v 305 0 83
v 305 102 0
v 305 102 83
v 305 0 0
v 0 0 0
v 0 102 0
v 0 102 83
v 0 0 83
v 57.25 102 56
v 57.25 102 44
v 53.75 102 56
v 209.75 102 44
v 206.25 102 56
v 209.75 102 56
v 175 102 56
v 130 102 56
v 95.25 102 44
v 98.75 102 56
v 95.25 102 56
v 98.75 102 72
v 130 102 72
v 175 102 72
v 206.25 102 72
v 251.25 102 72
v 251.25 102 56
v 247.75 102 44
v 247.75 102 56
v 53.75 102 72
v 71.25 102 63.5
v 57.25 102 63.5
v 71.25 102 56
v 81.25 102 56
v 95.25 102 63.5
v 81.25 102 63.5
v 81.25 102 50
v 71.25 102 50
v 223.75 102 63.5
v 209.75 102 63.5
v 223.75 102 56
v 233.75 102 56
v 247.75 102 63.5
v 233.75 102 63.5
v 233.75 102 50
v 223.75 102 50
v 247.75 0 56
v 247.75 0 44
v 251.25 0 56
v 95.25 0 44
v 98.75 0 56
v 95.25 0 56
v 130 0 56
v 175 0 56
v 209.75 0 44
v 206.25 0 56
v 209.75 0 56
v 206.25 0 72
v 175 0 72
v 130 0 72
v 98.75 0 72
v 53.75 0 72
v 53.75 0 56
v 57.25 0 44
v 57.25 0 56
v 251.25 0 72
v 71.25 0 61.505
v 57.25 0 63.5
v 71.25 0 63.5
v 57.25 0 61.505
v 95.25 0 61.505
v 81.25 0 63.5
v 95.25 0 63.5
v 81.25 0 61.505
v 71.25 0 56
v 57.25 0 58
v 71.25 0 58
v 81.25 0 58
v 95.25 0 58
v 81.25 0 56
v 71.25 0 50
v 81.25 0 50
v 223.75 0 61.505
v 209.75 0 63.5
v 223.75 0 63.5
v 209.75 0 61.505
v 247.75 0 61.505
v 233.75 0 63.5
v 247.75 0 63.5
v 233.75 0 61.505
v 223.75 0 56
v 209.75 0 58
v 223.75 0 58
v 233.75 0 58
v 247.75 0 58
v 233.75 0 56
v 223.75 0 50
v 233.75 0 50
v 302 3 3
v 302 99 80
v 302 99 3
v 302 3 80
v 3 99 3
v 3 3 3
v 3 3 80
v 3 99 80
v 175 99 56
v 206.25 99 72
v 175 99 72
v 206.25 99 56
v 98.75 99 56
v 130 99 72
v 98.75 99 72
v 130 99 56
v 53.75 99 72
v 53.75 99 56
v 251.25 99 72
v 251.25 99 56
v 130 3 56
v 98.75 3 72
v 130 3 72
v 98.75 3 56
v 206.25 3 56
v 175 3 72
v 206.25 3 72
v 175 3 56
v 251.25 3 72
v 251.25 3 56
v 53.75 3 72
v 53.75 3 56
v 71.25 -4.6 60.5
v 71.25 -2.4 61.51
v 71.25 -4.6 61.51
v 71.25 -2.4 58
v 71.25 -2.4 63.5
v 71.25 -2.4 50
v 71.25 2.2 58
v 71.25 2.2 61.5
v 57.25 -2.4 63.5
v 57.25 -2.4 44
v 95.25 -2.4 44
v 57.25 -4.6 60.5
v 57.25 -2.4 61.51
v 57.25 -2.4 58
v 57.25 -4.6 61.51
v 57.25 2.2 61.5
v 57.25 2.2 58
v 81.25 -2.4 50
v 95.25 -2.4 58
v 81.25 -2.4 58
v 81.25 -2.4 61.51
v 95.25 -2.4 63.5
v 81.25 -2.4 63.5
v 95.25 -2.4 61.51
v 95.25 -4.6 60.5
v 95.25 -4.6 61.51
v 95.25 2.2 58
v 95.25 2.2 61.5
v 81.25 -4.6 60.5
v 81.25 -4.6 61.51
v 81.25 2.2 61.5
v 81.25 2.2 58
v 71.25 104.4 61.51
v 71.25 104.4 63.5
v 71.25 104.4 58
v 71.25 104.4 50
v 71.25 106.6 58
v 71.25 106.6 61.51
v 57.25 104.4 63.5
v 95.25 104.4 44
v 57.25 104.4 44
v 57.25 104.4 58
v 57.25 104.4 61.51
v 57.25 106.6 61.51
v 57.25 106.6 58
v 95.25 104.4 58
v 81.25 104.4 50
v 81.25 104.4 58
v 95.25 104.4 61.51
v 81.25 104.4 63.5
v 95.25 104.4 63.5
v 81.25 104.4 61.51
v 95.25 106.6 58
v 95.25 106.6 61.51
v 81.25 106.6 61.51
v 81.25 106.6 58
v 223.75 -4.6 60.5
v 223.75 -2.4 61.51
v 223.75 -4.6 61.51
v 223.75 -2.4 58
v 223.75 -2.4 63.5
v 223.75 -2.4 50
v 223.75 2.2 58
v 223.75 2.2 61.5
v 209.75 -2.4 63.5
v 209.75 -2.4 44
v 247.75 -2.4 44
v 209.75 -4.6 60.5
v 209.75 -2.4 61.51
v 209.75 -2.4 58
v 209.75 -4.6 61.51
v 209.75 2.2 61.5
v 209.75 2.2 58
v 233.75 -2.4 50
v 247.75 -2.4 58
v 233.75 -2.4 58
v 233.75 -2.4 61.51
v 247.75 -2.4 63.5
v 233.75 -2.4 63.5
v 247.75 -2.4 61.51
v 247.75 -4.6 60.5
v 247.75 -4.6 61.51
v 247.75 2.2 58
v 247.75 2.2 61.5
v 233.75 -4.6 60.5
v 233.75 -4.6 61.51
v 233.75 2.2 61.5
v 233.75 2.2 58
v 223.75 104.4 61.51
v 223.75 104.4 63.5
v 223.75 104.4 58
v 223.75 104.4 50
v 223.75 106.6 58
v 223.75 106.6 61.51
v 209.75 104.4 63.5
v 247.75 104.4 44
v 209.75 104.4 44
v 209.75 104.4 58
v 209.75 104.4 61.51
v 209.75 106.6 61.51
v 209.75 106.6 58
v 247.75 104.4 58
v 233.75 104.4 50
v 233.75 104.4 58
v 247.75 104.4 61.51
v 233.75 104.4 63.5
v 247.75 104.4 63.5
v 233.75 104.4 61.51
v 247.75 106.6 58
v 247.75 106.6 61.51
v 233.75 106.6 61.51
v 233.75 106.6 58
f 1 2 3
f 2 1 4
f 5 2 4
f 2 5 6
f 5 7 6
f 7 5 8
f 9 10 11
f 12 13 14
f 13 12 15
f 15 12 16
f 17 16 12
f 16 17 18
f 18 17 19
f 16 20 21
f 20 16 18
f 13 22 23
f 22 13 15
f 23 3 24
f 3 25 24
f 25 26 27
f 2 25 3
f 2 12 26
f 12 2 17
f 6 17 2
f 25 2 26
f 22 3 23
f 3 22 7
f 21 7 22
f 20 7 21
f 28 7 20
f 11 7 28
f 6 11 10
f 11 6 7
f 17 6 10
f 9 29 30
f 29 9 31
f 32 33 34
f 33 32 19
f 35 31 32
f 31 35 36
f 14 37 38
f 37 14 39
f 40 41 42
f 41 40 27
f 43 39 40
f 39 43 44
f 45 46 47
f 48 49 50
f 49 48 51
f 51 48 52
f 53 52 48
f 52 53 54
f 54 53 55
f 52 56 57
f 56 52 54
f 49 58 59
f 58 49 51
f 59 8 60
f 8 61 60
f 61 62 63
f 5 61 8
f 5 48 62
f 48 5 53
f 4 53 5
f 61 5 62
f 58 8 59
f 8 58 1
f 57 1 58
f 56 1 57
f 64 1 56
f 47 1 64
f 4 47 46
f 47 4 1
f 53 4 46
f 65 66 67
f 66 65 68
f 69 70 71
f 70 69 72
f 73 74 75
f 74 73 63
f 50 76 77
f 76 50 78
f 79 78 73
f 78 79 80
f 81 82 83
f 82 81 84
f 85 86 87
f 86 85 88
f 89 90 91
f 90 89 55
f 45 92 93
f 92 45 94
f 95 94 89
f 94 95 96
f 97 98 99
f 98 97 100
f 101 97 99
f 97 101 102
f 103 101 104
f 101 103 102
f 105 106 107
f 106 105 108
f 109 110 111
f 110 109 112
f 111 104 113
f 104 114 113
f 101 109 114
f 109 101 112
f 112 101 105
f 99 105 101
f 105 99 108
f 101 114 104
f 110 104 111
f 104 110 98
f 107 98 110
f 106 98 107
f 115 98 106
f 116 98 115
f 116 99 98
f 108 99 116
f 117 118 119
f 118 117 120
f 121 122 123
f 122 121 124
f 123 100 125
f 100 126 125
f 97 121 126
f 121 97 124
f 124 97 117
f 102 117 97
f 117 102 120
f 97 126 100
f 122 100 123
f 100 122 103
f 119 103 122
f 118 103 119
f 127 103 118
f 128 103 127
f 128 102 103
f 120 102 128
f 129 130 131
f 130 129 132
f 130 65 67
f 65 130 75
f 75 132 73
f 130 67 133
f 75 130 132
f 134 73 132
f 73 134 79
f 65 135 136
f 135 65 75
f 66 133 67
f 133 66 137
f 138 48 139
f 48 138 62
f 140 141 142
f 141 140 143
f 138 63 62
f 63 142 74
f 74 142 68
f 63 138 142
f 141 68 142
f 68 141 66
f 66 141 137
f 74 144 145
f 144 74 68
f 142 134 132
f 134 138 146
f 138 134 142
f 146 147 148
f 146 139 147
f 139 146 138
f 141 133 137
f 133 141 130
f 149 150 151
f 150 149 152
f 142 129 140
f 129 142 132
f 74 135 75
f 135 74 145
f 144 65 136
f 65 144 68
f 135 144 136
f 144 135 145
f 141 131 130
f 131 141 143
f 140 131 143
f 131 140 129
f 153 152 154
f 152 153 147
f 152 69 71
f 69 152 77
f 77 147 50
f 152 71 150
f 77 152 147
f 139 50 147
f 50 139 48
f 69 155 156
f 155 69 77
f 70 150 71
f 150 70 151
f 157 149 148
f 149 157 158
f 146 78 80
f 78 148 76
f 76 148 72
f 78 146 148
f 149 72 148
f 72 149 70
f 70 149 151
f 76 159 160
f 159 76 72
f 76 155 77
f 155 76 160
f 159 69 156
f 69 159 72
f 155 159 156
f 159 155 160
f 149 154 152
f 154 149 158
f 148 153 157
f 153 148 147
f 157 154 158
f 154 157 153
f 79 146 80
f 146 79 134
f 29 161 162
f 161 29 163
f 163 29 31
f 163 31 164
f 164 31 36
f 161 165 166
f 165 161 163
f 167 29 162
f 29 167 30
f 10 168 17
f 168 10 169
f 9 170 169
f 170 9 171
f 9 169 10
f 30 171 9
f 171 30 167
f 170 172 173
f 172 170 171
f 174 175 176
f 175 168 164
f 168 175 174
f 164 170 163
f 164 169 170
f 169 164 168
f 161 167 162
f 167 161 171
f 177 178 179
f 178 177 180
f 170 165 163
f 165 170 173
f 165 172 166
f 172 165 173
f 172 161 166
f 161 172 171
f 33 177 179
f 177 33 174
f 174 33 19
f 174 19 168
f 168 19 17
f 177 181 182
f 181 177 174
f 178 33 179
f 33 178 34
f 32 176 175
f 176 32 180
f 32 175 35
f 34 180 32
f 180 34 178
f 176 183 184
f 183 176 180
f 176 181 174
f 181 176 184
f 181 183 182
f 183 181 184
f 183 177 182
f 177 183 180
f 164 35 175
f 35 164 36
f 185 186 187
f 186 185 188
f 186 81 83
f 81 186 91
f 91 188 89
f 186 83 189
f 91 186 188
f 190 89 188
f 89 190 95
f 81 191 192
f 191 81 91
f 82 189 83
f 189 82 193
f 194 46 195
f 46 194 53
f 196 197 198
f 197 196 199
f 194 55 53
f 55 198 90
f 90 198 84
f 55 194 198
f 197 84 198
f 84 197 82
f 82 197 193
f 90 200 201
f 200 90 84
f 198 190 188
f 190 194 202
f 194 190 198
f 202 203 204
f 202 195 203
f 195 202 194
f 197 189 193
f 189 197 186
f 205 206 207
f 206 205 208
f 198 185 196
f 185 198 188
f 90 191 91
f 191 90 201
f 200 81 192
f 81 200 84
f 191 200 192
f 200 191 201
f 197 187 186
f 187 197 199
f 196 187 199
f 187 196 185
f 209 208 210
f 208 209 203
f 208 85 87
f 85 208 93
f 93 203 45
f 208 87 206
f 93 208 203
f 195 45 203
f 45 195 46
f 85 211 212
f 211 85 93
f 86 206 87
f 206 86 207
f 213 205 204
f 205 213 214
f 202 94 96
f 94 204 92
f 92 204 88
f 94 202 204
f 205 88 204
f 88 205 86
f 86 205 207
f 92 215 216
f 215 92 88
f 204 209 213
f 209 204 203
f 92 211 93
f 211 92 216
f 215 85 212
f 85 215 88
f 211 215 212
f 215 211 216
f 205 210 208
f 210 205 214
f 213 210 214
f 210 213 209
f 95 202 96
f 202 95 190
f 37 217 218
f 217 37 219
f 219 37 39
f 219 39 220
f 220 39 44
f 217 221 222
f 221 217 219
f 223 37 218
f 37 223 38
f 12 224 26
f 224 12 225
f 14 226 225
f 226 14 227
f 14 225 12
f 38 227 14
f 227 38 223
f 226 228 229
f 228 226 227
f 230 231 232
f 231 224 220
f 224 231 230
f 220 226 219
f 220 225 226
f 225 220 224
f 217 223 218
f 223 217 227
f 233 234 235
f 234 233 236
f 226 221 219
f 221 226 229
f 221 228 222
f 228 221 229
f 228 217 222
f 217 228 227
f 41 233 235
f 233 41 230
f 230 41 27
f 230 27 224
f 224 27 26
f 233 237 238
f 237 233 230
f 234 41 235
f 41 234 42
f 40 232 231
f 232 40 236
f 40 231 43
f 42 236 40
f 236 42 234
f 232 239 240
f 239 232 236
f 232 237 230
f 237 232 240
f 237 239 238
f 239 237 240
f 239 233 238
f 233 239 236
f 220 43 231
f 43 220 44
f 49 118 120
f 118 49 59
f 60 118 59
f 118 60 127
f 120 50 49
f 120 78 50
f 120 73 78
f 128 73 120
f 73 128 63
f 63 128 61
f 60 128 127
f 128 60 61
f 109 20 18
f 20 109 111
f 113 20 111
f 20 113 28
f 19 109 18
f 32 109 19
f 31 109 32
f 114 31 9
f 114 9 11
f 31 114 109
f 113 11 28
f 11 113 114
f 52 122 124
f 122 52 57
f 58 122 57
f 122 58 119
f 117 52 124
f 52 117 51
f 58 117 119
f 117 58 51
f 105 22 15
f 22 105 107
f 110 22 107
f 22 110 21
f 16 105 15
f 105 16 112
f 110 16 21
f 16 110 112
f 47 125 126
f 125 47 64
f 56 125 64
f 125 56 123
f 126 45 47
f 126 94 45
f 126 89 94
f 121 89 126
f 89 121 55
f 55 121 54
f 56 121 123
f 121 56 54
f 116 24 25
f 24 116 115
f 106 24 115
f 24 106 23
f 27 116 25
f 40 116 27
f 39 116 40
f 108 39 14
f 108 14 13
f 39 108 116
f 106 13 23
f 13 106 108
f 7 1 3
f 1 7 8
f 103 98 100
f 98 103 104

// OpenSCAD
// 02_paired_fingers.scad
// RETROFIT ATTACHMENT — Version 2: Paired Fingers per Side
//
// NEW tray (z=0..50, blue) carries TWO narrower fingers side-by-side on each
// long face, at each of the two OUTER windows (windows 0 and 2).
// A base bridge connects the pair.  Both fingers of a pair hook the SAME
// window, doubling retention force and preventing rocking.
//
// TOP tray (z=50..83, grey) FIXED — ZERO geometry added.
//
// explode=0 engaged, explode=1 lifted apart.

explode = 0;

W    = 305;   D  = 102;   Hn = 50;   Ht = 33;   wall = 3;

win_w  = 45;   win_h = 16;   win_zc = 64;
function win_cx(i) = W * (i+1) / 4;

// Paired-finger geometry
fng_t    = 2.4;   // finger thickness
fng_w    = 14;    // single finger width (X)
fng_gap  = 10;    // gap between the two fingers of a pair
pad_h    = 6;     // base bridge height below new-tray top
hook_dep = 2.2;
hook_h   = 3.5;
lead_in  = 1.0;
root_z   = pad_h;

hook_z = win_zc - win_h/2 + 2;

expl = 45 * explode;

c_new  = [0.22, 0.55, 0.85, 1.00];
c_top  = [0.80, 0.80, 0.80, 0.80];
c_clip = [0.12, 0.72, 0.30, 1.00];   // green

module top_tray() {
    color(c_top)
    translate([0, 0, Hn + expl])
    difference() {
        cube([W, D, Ht]);
        translate([wall, wall, -0.01])
            cube([W-2*wall, D-2*wall, Ht-wall+0.01]);
        for (i=[0:2]) {
            translate([win_cx(i)-win_w/2, -0.01, (win_zc-Hn)-win_h/2])
                cube([win_w, wall+0.02, win_h]);
            translate([win_cx(i)-win_w/2, D-wall-0.01, (win_zc-Hn)-win_h/2])
                cube([win_w, wall+0.02, win_h]);
        }
    }
}

module new_tray_body() {
    color(c_new)
    difference() {
        cube([W, D, Hn]);
        translate([wall, wall, wall])
            cube([W-2*wall, D-2*wall, Hn]);
    }
}

// One pair of fingers hooking window win_i on given side
module finger_pair(side, win_i) {
    cx   = win_cx(win_i);
    y0   = (side==0) ? -fng_t : D;
    inwd = (side==0) ? 1 : -1;

    // X positions of the two fingers (centred on window)
    half_span = fng_gap/2 + fng_w/2;
    xs = [cx - half_span - fng_w/2, cx + half_span - fng_w/2];

    stem_bot = Hn - root_z;
    stem_top = hook_z + hook_h + 2;

    color(c_clip) {
        // base bridge connecting both fingers
        bridge_x0 = cx - half_span - fng_w/2;
        bridge_x1 = cx + half_span + fng_w/2;
        translate([bridge_x0, y0, stem_bot])
            cube([bridge_x1 - bridge_x0, fng_t, pad_h]);

        // two fingers
        for (fx = xs) {
            // stem
            translate([fx, y0, stem_bot])
                cube([fng_w, fng_t, stem_top - stem_bot]);
            // hook
            translate([fx, y0, hook_z])
            hull() {
                cube([fng_w, fng_t + hook_dep, hook_h]);
                translate([0, inwd * (-hook_dep), hook_h - lead_in])
                    cube([fng_w, fng_t, lead_in + 0.01]);
            }
        }
    }
}

// ASSEMBLY — pairs at outer windows 0 and 2, both sides
new_tray_body();
for (wi = [0, 2]) {
    finger_pair(0, wi);
    finger_pair(1, wi);
}
top_tray();
